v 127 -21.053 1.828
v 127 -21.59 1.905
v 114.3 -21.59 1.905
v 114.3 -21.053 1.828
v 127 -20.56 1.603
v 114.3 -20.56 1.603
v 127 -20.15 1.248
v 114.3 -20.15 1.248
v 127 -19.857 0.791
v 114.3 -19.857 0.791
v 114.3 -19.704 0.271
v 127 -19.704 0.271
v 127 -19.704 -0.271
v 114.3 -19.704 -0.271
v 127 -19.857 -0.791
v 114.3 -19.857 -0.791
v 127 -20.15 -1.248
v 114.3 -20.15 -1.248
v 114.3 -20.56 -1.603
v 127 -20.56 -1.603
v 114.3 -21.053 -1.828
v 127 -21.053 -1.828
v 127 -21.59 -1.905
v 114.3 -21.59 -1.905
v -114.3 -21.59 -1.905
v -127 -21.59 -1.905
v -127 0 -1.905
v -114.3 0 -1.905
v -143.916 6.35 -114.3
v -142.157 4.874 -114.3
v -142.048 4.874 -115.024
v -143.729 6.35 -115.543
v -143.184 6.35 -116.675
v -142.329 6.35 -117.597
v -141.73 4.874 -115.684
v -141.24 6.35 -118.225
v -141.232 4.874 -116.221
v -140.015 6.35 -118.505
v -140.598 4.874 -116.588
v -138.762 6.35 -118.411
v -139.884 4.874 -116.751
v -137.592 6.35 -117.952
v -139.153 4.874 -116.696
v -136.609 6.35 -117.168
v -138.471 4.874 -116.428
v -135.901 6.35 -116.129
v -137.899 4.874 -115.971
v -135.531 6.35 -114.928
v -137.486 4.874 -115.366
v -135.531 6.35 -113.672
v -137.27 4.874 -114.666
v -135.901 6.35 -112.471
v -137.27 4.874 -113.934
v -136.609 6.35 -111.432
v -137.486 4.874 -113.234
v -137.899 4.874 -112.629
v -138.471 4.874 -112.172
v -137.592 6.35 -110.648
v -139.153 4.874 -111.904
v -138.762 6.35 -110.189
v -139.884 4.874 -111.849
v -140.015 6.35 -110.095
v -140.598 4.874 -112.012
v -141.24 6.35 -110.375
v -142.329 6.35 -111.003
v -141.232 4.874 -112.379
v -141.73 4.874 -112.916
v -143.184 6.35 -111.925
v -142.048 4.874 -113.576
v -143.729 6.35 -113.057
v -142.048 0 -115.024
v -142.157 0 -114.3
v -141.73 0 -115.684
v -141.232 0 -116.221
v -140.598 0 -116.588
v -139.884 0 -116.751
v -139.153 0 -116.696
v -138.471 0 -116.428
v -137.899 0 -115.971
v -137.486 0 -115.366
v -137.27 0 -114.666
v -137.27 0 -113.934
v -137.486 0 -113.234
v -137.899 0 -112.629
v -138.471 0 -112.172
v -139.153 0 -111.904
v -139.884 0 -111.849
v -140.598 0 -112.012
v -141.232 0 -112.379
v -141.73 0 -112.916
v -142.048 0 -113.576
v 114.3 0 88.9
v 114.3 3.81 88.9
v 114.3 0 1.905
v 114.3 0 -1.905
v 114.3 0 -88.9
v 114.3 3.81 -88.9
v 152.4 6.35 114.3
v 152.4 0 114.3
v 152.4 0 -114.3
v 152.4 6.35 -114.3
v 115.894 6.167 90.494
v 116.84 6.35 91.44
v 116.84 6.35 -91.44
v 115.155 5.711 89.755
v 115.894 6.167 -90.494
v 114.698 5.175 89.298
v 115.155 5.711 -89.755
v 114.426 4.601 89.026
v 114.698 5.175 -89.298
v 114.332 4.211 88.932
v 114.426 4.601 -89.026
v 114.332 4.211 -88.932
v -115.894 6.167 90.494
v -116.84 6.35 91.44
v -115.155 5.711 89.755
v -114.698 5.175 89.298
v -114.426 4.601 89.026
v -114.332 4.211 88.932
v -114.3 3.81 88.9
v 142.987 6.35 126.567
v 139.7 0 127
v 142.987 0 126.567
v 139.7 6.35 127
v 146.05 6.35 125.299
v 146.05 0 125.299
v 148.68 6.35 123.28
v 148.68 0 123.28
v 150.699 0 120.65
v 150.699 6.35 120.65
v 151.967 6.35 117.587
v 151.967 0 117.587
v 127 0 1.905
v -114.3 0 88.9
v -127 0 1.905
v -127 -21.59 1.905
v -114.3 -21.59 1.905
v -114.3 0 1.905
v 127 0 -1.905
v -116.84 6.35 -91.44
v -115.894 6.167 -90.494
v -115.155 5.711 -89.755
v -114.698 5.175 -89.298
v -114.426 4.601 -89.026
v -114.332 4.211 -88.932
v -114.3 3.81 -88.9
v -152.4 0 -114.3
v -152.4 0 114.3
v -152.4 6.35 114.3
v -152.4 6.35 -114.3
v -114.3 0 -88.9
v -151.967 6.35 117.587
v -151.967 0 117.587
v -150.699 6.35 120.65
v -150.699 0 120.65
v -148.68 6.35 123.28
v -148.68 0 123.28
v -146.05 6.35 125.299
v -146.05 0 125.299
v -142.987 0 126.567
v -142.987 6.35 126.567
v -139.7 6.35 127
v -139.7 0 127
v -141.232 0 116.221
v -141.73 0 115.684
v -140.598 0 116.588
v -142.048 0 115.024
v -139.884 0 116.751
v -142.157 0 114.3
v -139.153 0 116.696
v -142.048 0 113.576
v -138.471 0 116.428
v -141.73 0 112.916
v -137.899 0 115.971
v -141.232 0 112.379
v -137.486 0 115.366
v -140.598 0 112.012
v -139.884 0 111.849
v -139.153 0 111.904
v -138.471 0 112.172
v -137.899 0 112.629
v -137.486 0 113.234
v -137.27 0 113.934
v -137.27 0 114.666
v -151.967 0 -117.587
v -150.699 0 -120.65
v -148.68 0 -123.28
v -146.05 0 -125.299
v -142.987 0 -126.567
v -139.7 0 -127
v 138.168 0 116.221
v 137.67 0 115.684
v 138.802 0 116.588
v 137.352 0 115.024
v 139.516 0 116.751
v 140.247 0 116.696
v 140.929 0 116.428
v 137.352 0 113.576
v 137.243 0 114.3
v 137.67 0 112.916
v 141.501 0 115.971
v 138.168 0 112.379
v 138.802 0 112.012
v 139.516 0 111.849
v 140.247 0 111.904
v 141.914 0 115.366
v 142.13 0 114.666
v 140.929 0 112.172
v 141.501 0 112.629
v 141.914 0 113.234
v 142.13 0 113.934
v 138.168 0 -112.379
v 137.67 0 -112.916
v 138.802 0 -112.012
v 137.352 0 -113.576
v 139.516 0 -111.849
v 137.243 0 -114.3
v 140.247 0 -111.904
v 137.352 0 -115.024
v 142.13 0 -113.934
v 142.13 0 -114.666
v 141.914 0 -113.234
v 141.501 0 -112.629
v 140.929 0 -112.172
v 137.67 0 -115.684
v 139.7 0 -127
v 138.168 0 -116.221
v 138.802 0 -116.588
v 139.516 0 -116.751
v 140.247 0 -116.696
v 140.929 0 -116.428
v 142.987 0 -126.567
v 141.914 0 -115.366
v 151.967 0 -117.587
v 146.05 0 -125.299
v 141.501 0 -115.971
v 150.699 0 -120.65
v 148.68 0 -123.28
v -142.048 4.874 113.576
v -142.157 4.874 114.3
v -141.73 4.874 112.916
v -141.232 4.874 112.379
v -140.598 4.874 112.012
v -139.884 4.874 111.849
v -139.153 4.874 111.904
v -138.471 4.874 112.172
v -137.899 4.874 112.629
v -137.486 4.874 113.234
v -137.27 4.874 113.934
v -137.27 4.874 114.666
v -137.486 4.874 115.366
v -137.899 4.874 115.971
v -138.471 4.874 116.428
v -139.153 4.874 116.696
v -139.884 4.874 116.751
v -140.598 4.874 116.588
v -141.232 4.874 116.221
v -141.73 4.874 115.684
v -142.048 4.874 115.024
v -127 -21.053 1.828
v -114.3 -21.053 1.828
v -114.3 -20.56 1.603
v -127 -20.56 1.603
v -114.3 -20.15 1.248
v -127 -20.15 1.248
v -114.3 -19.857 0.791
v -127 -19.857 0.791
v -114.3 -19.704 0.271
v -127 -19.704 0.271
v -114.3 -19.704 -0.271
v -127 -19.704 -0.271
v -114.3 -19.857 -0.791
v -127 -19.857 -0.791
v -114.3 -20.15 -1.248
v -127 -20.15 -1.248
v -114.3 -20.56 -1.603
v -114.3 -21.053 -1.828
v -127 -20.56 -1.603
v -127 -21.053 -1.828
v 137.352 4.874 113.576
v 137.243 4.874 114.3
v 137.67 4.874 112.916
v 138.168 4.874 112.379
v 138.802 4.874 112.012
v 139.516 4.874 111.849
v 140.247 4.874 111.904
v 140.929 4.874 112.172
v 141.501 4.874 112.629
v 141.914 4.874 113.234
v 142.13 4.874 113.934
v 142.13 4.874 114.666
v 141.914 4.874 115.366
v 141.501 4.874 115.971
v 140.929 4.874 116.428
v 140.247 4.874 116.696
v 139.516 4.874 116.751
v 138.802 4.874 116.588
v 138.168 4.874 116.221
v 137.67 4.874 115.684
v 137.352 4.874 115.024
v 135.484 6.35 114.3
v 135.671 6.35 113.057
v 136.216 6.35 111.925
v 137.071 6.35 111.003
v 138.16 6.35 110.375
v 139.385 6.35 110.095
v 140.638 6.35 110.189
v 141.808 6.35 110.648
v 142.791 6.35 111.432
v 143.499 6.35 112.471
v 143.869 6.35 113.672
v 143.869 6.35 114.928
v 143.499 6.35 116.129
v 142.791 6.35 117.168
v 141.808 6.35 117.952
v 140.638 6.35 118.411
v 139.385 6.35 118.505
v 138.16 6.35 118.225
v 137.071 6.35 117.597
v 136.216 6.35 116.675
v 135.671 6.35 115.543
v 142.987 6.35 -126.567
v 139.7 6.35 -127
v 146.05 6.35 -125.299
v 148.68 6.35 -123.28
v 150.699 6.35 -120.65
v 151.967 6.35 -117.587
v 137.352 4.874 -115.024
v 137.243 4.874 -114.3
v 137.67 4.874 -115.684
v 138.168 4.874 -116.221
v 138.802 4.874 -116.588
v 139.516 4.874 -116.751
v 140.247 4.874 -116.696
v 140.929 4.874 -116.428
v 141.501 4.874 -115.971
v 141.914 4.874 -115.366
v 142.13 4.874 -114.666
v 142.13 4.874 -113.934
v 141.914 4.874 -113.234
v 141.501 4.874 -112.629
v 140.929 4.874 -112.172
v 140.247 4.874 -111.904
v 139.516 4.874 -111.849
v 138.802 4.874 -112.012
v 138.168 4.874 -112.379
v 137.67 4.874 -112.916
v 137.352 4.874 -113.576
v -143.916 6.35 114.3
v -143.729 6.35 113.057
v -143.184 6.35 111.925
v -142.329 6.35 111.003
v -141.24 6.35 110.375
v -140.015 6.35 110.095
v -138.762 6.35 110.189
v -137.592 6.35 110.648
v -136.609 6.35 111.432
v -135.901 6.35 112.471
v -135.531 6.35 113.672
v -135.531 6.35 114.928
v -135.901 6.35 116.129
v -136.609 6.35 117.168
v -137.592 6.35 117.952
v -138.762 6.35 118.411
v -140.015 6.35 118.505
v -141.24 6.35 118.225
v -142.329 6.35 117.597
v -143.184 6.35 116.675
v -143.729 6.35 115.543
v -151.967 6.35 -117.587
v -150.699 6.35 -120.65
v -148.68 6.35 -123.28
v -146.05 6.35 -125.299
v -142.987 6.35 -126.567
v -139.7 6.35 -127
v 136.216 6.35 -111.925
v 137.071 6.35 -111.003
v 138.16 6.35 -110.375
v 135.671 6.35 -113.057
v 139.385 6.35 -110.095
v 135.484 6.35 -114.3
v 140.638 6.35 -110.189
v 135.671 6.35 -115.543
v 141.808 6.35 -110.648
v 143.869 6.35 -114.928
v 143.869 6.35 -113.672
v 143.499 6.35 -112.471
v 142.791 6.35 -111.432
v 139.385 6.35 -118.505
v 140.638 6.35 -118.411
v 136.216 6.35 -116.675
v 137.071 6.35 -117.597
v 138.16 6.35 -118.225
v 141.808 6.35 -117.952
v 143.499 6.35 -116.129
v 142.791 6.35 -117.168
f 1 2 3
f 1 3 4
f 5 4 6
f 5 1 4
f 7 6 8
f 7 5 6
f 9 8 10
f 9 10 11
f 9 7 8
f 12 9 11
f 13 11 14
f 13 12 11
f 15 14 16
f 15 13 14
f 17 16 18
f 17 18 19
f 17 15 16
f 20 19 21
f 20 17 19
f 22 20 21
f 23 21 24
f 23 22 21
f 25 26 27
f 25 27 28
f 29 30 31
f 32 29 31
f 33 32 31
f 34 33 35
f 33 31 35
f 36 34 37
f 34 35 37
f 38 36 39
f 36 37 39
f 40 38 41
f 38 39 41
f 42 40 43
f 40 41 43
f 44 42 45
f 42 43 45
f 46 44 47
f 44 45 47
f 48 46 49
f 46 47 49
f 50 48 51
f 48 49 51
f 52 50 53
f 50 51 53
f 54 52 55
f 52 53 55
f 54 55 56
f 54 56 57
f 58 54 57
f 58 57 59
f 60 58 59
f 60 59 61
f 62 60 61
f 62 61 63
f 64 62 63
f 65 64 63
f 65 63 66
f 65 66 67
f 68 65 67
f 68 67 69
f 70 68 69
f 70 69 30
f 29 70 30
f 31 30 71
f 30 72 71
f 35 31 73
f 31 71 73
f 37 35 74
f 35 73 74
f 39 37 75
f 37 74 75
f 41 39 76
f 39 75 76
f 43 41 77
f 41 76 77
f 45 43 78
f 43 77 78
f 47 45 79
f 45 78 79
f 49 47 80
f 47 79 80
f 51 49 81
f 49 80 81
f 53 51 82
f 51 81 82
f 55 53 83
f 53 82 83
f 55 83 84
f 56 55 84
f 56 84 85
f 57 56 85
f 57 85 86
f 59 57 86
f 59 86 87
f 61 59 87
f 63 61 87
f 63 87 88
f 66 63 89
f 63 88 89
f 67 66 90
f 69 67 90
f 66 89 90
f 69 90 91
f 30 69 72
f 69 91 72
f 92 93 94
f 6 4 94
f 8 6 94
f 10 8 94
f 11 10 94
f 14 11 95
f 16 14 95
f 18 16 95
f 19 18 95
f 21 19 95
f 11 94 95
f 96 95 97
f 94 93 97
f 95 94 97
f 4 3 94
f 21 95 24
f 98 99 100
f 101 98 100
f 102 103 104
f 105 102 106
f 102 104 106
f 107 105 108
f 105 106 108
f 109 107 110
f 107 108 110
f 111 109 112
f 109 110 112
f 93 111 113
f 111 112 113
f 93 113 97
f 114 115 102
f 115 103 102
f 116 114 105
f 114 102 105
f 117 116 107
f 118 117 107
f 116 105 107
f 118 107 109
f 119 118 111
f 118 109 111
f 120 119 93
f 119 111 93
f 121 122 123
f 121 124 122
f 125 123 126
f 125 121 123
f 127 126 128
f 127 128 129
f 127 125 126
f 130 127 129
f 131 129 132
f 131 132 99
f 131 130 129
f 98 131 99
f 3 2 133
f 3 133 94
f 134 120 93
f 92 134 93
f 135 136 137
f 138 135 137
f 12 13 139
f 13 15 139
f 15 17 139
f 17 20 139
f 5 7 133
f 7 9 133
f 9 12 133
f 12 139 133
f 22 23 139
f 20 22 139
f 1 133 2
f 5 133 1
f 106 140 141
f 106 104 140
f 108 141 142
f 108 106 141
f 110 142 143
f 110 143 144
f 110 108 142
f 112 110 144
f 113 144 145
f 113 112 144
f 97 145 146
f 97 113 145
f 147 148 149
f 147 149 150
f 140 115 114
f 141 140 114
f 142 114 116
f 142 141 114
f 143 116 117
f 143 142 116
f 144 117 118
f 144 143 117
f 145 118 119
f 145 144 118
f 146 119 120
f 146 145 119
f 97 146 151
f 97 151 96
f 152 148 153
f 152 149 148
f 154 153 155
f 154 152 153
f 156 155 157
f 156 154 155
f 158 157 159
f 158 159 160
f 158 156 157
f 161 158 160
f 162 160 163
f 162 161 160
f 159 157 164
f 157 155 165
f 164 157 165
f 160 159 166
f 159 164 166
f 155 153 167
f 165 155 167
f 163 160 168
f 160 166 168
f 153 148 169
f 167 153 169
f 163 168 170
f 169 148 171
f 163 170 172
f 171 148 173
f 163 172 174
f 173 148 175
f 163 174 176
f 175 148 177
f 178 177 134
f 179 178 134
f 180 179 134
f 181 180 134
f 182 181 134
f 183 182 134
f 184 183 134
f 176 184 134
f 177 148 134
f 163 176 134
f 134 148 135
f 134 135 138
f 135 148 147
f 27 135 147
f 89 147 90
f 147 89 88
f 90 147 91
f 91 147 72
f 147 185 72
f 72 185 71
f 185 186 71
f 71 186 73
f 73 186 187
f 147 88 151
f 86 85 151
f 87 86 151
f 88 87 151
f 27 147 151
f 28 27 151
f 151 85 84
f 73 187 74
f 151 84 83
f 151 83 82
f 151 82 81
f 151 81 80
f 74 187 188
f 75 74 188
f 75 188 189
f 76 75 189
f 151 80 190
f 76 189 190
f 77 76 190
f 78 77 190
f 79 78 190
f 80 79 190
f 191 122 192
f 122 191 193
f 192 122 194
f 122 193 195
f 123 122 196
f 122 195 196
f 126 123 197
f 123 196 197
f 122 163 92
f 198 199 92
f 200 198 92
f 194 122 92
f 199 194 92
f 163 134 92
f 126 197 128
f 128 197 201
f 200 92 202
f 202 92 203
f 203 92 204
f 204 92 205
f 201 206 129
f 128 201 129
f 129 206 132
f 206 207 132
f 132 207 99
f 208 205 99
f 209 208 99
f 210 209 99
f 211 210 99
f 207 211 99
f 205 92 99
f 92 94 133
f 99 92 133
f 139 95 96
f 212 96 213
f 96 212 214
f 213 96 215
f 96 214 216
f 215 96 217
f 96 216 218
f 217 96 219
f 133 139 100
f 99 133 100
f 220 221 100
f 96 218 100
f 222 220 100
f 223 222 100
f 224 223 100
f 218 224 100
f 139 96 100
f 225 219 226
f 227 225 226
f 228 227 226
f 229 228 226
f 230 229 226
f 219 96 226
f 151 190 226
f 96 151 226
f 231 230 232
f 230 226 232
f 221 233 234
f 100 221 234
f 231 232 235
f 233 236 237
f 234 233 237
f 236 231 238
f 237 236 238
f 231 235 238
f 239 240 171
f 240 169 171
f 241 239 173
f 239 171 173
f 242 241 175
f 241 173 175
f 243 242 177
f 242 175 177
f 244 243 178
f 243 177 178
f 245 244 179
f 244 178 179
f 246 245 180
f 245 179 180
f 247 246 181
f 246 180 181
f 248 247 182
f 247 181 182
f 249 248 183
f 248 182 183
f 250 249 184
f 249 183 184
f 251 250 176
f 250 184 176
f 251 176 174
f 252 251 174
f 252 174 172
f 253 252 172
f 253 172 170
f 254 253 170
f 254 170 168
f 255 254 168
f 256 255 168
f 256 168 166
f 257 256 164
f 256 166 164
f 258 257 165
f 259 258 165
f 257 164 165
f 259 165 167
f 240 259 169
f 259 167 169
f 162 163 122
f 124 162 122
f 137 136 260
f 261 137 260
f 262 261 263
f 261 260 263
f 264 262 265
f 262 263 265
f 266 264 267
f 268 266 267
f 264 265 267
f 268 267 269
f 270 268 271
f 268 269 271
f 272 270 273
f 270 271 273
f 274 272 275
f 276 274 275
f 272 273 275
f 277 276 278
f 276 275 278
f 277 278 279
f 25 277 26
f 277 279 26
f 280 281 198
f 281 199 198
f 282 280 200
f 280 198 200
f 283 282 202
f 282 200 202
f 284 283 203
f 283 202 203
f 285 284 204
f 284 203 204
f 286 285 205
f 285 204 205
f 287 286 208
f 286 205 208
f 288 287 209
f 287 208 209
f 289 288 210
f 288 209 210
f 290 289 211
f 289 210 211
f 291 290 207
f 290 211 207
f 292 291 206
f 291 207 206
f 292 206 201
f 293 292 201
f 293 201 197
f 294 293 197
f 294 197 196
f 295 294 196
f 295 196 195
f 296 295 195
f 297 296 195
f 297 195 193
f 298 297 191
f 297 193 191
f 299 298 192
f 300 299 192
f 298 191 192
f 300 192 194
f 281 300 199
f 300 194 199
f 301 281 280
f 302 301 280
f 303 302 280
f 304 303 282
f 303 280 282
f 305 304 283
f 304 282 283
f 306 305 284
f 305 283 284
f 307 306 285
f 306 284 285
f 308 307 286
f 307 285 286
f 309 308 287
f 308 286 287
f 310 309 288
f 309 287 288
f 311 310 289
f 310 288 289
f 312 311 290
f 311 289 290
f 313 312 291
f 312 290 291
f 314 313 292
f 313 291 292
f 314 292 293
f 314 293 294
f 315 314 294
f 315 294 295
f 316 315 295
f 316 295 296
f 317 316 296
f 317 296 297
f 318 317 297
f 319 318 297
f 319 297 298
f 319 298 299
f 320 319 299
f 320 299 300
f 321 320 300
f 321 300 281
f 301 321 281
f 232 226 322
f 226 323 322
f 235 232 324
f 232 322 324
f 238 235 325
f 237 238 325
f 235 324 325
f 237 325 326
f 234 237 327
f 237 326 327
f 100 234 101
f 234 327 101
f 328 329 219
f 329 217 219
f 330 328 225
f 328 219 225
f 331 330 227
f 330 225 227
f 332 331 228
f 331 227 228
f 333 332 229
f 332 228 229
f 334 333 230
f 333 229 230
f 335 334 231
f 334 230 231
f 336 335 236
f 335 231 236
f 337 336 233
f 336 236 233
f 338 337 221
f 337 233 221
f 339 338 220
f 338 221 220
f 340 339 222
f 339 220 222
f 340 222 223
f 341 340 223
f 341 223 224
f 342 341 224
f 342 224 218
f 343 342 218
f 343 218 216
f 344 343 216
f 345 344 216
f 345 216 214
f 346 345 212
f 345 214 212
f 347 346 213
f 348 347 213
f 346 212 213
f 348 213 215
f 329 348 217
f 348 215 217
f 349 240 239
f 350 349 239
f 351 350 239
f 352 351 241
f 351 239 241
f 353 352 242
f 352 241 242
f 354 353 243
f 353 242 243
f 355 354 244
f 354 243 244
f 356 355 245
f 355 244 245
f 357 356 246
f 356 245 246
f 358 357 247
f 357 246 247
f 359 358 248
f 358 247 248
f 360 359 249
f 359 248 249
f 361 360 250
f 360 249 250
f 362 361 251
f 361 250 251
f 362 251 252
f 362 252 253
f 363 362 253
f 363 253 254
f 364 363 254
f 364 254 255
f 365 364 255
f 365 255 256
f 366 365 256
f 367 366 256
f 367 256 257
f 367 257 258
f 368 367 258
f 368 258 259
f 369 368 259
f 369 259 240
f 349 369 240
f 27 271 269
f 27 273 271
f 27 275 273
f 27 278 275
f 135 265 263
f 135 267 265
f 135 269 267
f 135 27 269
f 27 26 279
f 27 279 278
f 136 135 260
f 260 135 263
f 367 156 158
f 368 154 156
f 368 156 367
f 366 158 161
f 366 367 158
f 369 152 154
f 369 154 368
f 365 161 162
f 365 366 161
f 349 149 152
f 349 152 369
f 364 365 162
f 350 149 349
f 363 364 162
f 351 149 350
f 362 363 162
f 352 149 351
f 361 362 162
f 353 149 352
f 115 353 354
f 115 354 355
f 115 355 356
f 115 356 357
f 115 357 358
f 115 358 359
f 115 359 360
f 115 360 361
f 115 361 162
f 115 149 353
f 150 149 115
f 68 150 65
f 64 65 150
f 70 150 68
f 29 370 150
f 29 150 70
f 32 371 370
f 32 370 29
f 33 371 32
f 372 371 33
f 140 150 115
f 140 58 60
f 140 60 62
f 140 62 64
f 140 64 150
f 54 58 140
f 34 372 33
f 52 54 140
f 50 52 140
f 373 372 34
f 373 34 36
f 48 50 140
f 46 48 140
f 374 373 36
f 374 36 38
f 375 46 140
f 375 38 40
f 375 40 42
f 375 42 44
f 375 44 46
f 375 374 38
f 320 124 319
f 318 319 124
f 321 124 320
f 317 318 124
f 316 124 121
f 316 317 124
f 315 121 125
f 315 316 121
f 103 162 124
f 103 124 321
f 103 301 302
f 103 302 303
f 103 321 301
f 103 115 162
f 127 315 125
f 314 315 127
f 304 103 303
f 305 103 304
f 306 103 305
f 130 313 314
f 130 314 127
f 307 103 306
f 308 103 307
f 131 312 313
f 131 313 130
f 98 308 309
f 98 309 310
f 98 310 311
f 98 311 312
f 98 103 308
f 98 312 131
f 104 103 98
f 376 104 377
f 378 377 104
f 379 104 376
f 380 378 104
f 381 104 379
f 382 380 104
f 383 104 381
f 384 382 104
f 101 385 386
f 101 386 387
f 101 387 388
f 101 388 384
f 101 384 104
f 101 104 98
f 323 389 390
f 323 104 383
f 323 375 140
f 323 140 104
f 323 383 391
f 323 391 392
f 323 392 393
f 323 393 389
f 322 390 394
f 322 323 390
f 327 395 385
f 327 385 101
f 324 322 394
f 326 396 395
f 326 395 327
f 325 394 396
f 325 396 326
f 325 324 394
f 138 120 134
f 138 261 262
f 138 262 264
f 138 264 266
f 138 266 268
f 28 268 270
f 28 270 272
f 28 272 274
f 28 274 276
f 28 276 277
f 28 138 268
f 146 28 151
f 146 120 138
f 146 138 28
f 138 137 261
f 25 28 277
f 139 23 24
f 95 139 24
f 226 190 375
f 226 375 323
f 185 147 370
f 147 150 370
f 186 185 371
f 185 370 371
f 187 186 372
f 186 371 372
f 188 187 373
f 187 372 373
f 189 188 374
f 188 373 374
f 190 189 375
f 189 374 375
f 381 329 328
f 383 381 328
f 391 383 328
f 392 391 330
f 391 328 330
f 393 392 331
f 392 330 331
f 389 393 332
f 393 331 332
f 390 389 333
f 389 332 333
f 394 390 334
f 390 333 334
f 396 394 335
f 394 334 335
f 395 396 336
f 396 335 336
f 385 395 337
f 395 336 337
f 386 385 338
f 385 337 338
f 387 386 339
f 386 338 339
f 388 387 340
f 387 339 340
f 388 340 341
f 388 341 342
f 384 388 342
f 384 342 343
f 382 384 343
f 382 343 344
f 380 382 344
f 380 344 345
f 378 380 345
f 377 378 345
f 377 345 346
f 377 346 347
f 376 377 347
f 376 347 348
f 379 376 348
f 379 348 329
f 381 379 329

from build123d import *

# Parameters (mm, degrees)
SKETCH1_W                                         = 304.8
SKETCH1_H                                         = 254
BOSS_EXTRUDE1_DEPTH                               = 6.35
SKETCH2_W                                         = 228.6
SKETCH2_H                                         = 177.8
CUT_EXTRUDE1_DEPTH                                = 6.35
FILLET1_R                                         = 2.54
FILLET5_R                                         = 12.7
SKETCH6_W                                         = 12.7
SKETCH6_H                                         = 3.81
BOSS_EXTRUDE3_DEPTH                               = 21.59
SKETCH8_R                                         = 1.905
CUT_EXTRUDE5_DEPTH                                = 12.7
CSK_FOR_8_FLAT_HEAD_MACHINE_SCREW_100_D           = 4.9149
CSK_FOR_8_FLAT_HEAD_MACHINE_SCREW_100_DEPTH       = 10.668
CSK_FOR_8_FLAT_HEAD_MACHINE_SCREW_100_CSINK_D     = 8.4328
CSK_FOR_8_FLAT_HEAD_MACHINE_SCREW_100_CSINK_ANGLE = 100
CSK_FOR_8_FLAT_HEAD_MACHINE_SCREW_100_TIP         = 1.476584928


with BuildPart() as part:
    # Sketch1 → Boss-Extrude1 (new body)
    with BuildSketch(Plane(origin=(0, 0, 0), x_dir=(1, 0, 0), z_dir=(0, 1, 0))):
        Rectangle(SKETCH1_W, SKETCH1_H)
    extrude(amount=BOSS_EXTRUDE1_DEPTH)

    # Sketch2 → Cut-Extrude1 (cut)
    with BuildSketch(Plane(origin=(0, 6.35, 0), x_dir=(1, 0, 0), z_dir=(0, 1, 0))):
        Rectangle(SKETCH2_W, SKETCH2_H)
    extrude(amount=-CUT_EXTRUDE1_DEPTH, mode=Mode.SUBTRACT)

    # Fillet1
    fillet1_edges = [part.edges().sort_by_distance(p)[0] for p in [
        (114.3, 6.35, 0),
        (0, 6.35, -88.9),
        (-114.3, 6.35, 0),
        (0, 6.35, 88.9),
    ]]
    fillet(fillet1_edges, radius=FILLET1_R)

    # Fillet5
    fillet5_edges = [part.edges().sort_by_distance(p)[0] for p in [
        (152.4, 3.175, 127),
        (-152.4, 3.175, 127),
        (-152.4, 3.175, -127),
        (152.4, 3.175, -127),
    ]]
    fillet(fillet5_edges, radius=FILLET5_R)

    # Sketch6 → Boss-Extrude3 (add)
    with BuildSketch(Plane.XZ):
        with Locations((-120.65, 0)):
            Rectangle(SKETCH6_W, SKETCH6_H)
    boss_extrude3 = extrude(amount=BOSS_EXTRUDE3_DEPTH)

    # Sketch8 → Cut-Extrude5 (cut)
    with BuildSketch(Plane.ZY.offset(127)):
        with Locations((0, -21.59)):
            Circle(SKETCH8_R)
    cut_extrude5 = extrude(amount=-CUT_EXTRUDE5_DEPTH, mode=Mode.SUBTRACT)

    # Mirror1: Boss-Extrude3, Cut-Extrude5 across plane
    add(boss_extrude3.mirror(Plane(origin=(0, 0, 0), x_dir=(0, 0, 1), z_dir=(1, 0, 0))))
    add(cut_extrude5.mirror(Plane(origin=(0, 0, 0), x_dir=(0, 0, 1), z_dir=(1, 0, 0))), mode=Mode.SUBTRACT)

    # CSK for #8 Flat Head Machine Screw (100)1
    with Locations(Plane(origin=(0, 6.35, 0), x_dir=(1, 0, 0), z_dir=(0, 1, 0))):
        with Locations((-139.7, -114.3), (139.7, -114.3), (139.7, 114.3), (-139.7, 114.3)):
            CounterSinkHole(CSK_FOR_8_FLAT_HEAD_MACHINE_SCREW_100_D / 2, CSK_FOR_8_FLAT_HEAD_MACHINE_SCREW_100_CSINK_D / 2, depth=CSK_FOR_8_FLAT_HEAD_MACHINE_SCREW_100_DEPTH, counter_sink_angle=CSK_FOR_8_FLAT_HEAD_MACHINE_SCREW_100_CSINK_ANGLE)
            with Locations((0, 0, -(CSK_FOR_8_FLAT_HEAD_MACHINE_SCREW_100_DEPTH + CSK_FOR_8_FLAT_HEAD_MACHINE_SCREW_100_TIP / 2))):  # 118° drill point
                Cone(0, CSK_FOR_8_FLAT_HEAD_MACHINE_SCREW_100_D / 2, CSK_FOR_8_FLAT_HEAD_MACHINE_SCREW_100_TIP, mode=Mode.SUBTRACT)


solid = part.part
